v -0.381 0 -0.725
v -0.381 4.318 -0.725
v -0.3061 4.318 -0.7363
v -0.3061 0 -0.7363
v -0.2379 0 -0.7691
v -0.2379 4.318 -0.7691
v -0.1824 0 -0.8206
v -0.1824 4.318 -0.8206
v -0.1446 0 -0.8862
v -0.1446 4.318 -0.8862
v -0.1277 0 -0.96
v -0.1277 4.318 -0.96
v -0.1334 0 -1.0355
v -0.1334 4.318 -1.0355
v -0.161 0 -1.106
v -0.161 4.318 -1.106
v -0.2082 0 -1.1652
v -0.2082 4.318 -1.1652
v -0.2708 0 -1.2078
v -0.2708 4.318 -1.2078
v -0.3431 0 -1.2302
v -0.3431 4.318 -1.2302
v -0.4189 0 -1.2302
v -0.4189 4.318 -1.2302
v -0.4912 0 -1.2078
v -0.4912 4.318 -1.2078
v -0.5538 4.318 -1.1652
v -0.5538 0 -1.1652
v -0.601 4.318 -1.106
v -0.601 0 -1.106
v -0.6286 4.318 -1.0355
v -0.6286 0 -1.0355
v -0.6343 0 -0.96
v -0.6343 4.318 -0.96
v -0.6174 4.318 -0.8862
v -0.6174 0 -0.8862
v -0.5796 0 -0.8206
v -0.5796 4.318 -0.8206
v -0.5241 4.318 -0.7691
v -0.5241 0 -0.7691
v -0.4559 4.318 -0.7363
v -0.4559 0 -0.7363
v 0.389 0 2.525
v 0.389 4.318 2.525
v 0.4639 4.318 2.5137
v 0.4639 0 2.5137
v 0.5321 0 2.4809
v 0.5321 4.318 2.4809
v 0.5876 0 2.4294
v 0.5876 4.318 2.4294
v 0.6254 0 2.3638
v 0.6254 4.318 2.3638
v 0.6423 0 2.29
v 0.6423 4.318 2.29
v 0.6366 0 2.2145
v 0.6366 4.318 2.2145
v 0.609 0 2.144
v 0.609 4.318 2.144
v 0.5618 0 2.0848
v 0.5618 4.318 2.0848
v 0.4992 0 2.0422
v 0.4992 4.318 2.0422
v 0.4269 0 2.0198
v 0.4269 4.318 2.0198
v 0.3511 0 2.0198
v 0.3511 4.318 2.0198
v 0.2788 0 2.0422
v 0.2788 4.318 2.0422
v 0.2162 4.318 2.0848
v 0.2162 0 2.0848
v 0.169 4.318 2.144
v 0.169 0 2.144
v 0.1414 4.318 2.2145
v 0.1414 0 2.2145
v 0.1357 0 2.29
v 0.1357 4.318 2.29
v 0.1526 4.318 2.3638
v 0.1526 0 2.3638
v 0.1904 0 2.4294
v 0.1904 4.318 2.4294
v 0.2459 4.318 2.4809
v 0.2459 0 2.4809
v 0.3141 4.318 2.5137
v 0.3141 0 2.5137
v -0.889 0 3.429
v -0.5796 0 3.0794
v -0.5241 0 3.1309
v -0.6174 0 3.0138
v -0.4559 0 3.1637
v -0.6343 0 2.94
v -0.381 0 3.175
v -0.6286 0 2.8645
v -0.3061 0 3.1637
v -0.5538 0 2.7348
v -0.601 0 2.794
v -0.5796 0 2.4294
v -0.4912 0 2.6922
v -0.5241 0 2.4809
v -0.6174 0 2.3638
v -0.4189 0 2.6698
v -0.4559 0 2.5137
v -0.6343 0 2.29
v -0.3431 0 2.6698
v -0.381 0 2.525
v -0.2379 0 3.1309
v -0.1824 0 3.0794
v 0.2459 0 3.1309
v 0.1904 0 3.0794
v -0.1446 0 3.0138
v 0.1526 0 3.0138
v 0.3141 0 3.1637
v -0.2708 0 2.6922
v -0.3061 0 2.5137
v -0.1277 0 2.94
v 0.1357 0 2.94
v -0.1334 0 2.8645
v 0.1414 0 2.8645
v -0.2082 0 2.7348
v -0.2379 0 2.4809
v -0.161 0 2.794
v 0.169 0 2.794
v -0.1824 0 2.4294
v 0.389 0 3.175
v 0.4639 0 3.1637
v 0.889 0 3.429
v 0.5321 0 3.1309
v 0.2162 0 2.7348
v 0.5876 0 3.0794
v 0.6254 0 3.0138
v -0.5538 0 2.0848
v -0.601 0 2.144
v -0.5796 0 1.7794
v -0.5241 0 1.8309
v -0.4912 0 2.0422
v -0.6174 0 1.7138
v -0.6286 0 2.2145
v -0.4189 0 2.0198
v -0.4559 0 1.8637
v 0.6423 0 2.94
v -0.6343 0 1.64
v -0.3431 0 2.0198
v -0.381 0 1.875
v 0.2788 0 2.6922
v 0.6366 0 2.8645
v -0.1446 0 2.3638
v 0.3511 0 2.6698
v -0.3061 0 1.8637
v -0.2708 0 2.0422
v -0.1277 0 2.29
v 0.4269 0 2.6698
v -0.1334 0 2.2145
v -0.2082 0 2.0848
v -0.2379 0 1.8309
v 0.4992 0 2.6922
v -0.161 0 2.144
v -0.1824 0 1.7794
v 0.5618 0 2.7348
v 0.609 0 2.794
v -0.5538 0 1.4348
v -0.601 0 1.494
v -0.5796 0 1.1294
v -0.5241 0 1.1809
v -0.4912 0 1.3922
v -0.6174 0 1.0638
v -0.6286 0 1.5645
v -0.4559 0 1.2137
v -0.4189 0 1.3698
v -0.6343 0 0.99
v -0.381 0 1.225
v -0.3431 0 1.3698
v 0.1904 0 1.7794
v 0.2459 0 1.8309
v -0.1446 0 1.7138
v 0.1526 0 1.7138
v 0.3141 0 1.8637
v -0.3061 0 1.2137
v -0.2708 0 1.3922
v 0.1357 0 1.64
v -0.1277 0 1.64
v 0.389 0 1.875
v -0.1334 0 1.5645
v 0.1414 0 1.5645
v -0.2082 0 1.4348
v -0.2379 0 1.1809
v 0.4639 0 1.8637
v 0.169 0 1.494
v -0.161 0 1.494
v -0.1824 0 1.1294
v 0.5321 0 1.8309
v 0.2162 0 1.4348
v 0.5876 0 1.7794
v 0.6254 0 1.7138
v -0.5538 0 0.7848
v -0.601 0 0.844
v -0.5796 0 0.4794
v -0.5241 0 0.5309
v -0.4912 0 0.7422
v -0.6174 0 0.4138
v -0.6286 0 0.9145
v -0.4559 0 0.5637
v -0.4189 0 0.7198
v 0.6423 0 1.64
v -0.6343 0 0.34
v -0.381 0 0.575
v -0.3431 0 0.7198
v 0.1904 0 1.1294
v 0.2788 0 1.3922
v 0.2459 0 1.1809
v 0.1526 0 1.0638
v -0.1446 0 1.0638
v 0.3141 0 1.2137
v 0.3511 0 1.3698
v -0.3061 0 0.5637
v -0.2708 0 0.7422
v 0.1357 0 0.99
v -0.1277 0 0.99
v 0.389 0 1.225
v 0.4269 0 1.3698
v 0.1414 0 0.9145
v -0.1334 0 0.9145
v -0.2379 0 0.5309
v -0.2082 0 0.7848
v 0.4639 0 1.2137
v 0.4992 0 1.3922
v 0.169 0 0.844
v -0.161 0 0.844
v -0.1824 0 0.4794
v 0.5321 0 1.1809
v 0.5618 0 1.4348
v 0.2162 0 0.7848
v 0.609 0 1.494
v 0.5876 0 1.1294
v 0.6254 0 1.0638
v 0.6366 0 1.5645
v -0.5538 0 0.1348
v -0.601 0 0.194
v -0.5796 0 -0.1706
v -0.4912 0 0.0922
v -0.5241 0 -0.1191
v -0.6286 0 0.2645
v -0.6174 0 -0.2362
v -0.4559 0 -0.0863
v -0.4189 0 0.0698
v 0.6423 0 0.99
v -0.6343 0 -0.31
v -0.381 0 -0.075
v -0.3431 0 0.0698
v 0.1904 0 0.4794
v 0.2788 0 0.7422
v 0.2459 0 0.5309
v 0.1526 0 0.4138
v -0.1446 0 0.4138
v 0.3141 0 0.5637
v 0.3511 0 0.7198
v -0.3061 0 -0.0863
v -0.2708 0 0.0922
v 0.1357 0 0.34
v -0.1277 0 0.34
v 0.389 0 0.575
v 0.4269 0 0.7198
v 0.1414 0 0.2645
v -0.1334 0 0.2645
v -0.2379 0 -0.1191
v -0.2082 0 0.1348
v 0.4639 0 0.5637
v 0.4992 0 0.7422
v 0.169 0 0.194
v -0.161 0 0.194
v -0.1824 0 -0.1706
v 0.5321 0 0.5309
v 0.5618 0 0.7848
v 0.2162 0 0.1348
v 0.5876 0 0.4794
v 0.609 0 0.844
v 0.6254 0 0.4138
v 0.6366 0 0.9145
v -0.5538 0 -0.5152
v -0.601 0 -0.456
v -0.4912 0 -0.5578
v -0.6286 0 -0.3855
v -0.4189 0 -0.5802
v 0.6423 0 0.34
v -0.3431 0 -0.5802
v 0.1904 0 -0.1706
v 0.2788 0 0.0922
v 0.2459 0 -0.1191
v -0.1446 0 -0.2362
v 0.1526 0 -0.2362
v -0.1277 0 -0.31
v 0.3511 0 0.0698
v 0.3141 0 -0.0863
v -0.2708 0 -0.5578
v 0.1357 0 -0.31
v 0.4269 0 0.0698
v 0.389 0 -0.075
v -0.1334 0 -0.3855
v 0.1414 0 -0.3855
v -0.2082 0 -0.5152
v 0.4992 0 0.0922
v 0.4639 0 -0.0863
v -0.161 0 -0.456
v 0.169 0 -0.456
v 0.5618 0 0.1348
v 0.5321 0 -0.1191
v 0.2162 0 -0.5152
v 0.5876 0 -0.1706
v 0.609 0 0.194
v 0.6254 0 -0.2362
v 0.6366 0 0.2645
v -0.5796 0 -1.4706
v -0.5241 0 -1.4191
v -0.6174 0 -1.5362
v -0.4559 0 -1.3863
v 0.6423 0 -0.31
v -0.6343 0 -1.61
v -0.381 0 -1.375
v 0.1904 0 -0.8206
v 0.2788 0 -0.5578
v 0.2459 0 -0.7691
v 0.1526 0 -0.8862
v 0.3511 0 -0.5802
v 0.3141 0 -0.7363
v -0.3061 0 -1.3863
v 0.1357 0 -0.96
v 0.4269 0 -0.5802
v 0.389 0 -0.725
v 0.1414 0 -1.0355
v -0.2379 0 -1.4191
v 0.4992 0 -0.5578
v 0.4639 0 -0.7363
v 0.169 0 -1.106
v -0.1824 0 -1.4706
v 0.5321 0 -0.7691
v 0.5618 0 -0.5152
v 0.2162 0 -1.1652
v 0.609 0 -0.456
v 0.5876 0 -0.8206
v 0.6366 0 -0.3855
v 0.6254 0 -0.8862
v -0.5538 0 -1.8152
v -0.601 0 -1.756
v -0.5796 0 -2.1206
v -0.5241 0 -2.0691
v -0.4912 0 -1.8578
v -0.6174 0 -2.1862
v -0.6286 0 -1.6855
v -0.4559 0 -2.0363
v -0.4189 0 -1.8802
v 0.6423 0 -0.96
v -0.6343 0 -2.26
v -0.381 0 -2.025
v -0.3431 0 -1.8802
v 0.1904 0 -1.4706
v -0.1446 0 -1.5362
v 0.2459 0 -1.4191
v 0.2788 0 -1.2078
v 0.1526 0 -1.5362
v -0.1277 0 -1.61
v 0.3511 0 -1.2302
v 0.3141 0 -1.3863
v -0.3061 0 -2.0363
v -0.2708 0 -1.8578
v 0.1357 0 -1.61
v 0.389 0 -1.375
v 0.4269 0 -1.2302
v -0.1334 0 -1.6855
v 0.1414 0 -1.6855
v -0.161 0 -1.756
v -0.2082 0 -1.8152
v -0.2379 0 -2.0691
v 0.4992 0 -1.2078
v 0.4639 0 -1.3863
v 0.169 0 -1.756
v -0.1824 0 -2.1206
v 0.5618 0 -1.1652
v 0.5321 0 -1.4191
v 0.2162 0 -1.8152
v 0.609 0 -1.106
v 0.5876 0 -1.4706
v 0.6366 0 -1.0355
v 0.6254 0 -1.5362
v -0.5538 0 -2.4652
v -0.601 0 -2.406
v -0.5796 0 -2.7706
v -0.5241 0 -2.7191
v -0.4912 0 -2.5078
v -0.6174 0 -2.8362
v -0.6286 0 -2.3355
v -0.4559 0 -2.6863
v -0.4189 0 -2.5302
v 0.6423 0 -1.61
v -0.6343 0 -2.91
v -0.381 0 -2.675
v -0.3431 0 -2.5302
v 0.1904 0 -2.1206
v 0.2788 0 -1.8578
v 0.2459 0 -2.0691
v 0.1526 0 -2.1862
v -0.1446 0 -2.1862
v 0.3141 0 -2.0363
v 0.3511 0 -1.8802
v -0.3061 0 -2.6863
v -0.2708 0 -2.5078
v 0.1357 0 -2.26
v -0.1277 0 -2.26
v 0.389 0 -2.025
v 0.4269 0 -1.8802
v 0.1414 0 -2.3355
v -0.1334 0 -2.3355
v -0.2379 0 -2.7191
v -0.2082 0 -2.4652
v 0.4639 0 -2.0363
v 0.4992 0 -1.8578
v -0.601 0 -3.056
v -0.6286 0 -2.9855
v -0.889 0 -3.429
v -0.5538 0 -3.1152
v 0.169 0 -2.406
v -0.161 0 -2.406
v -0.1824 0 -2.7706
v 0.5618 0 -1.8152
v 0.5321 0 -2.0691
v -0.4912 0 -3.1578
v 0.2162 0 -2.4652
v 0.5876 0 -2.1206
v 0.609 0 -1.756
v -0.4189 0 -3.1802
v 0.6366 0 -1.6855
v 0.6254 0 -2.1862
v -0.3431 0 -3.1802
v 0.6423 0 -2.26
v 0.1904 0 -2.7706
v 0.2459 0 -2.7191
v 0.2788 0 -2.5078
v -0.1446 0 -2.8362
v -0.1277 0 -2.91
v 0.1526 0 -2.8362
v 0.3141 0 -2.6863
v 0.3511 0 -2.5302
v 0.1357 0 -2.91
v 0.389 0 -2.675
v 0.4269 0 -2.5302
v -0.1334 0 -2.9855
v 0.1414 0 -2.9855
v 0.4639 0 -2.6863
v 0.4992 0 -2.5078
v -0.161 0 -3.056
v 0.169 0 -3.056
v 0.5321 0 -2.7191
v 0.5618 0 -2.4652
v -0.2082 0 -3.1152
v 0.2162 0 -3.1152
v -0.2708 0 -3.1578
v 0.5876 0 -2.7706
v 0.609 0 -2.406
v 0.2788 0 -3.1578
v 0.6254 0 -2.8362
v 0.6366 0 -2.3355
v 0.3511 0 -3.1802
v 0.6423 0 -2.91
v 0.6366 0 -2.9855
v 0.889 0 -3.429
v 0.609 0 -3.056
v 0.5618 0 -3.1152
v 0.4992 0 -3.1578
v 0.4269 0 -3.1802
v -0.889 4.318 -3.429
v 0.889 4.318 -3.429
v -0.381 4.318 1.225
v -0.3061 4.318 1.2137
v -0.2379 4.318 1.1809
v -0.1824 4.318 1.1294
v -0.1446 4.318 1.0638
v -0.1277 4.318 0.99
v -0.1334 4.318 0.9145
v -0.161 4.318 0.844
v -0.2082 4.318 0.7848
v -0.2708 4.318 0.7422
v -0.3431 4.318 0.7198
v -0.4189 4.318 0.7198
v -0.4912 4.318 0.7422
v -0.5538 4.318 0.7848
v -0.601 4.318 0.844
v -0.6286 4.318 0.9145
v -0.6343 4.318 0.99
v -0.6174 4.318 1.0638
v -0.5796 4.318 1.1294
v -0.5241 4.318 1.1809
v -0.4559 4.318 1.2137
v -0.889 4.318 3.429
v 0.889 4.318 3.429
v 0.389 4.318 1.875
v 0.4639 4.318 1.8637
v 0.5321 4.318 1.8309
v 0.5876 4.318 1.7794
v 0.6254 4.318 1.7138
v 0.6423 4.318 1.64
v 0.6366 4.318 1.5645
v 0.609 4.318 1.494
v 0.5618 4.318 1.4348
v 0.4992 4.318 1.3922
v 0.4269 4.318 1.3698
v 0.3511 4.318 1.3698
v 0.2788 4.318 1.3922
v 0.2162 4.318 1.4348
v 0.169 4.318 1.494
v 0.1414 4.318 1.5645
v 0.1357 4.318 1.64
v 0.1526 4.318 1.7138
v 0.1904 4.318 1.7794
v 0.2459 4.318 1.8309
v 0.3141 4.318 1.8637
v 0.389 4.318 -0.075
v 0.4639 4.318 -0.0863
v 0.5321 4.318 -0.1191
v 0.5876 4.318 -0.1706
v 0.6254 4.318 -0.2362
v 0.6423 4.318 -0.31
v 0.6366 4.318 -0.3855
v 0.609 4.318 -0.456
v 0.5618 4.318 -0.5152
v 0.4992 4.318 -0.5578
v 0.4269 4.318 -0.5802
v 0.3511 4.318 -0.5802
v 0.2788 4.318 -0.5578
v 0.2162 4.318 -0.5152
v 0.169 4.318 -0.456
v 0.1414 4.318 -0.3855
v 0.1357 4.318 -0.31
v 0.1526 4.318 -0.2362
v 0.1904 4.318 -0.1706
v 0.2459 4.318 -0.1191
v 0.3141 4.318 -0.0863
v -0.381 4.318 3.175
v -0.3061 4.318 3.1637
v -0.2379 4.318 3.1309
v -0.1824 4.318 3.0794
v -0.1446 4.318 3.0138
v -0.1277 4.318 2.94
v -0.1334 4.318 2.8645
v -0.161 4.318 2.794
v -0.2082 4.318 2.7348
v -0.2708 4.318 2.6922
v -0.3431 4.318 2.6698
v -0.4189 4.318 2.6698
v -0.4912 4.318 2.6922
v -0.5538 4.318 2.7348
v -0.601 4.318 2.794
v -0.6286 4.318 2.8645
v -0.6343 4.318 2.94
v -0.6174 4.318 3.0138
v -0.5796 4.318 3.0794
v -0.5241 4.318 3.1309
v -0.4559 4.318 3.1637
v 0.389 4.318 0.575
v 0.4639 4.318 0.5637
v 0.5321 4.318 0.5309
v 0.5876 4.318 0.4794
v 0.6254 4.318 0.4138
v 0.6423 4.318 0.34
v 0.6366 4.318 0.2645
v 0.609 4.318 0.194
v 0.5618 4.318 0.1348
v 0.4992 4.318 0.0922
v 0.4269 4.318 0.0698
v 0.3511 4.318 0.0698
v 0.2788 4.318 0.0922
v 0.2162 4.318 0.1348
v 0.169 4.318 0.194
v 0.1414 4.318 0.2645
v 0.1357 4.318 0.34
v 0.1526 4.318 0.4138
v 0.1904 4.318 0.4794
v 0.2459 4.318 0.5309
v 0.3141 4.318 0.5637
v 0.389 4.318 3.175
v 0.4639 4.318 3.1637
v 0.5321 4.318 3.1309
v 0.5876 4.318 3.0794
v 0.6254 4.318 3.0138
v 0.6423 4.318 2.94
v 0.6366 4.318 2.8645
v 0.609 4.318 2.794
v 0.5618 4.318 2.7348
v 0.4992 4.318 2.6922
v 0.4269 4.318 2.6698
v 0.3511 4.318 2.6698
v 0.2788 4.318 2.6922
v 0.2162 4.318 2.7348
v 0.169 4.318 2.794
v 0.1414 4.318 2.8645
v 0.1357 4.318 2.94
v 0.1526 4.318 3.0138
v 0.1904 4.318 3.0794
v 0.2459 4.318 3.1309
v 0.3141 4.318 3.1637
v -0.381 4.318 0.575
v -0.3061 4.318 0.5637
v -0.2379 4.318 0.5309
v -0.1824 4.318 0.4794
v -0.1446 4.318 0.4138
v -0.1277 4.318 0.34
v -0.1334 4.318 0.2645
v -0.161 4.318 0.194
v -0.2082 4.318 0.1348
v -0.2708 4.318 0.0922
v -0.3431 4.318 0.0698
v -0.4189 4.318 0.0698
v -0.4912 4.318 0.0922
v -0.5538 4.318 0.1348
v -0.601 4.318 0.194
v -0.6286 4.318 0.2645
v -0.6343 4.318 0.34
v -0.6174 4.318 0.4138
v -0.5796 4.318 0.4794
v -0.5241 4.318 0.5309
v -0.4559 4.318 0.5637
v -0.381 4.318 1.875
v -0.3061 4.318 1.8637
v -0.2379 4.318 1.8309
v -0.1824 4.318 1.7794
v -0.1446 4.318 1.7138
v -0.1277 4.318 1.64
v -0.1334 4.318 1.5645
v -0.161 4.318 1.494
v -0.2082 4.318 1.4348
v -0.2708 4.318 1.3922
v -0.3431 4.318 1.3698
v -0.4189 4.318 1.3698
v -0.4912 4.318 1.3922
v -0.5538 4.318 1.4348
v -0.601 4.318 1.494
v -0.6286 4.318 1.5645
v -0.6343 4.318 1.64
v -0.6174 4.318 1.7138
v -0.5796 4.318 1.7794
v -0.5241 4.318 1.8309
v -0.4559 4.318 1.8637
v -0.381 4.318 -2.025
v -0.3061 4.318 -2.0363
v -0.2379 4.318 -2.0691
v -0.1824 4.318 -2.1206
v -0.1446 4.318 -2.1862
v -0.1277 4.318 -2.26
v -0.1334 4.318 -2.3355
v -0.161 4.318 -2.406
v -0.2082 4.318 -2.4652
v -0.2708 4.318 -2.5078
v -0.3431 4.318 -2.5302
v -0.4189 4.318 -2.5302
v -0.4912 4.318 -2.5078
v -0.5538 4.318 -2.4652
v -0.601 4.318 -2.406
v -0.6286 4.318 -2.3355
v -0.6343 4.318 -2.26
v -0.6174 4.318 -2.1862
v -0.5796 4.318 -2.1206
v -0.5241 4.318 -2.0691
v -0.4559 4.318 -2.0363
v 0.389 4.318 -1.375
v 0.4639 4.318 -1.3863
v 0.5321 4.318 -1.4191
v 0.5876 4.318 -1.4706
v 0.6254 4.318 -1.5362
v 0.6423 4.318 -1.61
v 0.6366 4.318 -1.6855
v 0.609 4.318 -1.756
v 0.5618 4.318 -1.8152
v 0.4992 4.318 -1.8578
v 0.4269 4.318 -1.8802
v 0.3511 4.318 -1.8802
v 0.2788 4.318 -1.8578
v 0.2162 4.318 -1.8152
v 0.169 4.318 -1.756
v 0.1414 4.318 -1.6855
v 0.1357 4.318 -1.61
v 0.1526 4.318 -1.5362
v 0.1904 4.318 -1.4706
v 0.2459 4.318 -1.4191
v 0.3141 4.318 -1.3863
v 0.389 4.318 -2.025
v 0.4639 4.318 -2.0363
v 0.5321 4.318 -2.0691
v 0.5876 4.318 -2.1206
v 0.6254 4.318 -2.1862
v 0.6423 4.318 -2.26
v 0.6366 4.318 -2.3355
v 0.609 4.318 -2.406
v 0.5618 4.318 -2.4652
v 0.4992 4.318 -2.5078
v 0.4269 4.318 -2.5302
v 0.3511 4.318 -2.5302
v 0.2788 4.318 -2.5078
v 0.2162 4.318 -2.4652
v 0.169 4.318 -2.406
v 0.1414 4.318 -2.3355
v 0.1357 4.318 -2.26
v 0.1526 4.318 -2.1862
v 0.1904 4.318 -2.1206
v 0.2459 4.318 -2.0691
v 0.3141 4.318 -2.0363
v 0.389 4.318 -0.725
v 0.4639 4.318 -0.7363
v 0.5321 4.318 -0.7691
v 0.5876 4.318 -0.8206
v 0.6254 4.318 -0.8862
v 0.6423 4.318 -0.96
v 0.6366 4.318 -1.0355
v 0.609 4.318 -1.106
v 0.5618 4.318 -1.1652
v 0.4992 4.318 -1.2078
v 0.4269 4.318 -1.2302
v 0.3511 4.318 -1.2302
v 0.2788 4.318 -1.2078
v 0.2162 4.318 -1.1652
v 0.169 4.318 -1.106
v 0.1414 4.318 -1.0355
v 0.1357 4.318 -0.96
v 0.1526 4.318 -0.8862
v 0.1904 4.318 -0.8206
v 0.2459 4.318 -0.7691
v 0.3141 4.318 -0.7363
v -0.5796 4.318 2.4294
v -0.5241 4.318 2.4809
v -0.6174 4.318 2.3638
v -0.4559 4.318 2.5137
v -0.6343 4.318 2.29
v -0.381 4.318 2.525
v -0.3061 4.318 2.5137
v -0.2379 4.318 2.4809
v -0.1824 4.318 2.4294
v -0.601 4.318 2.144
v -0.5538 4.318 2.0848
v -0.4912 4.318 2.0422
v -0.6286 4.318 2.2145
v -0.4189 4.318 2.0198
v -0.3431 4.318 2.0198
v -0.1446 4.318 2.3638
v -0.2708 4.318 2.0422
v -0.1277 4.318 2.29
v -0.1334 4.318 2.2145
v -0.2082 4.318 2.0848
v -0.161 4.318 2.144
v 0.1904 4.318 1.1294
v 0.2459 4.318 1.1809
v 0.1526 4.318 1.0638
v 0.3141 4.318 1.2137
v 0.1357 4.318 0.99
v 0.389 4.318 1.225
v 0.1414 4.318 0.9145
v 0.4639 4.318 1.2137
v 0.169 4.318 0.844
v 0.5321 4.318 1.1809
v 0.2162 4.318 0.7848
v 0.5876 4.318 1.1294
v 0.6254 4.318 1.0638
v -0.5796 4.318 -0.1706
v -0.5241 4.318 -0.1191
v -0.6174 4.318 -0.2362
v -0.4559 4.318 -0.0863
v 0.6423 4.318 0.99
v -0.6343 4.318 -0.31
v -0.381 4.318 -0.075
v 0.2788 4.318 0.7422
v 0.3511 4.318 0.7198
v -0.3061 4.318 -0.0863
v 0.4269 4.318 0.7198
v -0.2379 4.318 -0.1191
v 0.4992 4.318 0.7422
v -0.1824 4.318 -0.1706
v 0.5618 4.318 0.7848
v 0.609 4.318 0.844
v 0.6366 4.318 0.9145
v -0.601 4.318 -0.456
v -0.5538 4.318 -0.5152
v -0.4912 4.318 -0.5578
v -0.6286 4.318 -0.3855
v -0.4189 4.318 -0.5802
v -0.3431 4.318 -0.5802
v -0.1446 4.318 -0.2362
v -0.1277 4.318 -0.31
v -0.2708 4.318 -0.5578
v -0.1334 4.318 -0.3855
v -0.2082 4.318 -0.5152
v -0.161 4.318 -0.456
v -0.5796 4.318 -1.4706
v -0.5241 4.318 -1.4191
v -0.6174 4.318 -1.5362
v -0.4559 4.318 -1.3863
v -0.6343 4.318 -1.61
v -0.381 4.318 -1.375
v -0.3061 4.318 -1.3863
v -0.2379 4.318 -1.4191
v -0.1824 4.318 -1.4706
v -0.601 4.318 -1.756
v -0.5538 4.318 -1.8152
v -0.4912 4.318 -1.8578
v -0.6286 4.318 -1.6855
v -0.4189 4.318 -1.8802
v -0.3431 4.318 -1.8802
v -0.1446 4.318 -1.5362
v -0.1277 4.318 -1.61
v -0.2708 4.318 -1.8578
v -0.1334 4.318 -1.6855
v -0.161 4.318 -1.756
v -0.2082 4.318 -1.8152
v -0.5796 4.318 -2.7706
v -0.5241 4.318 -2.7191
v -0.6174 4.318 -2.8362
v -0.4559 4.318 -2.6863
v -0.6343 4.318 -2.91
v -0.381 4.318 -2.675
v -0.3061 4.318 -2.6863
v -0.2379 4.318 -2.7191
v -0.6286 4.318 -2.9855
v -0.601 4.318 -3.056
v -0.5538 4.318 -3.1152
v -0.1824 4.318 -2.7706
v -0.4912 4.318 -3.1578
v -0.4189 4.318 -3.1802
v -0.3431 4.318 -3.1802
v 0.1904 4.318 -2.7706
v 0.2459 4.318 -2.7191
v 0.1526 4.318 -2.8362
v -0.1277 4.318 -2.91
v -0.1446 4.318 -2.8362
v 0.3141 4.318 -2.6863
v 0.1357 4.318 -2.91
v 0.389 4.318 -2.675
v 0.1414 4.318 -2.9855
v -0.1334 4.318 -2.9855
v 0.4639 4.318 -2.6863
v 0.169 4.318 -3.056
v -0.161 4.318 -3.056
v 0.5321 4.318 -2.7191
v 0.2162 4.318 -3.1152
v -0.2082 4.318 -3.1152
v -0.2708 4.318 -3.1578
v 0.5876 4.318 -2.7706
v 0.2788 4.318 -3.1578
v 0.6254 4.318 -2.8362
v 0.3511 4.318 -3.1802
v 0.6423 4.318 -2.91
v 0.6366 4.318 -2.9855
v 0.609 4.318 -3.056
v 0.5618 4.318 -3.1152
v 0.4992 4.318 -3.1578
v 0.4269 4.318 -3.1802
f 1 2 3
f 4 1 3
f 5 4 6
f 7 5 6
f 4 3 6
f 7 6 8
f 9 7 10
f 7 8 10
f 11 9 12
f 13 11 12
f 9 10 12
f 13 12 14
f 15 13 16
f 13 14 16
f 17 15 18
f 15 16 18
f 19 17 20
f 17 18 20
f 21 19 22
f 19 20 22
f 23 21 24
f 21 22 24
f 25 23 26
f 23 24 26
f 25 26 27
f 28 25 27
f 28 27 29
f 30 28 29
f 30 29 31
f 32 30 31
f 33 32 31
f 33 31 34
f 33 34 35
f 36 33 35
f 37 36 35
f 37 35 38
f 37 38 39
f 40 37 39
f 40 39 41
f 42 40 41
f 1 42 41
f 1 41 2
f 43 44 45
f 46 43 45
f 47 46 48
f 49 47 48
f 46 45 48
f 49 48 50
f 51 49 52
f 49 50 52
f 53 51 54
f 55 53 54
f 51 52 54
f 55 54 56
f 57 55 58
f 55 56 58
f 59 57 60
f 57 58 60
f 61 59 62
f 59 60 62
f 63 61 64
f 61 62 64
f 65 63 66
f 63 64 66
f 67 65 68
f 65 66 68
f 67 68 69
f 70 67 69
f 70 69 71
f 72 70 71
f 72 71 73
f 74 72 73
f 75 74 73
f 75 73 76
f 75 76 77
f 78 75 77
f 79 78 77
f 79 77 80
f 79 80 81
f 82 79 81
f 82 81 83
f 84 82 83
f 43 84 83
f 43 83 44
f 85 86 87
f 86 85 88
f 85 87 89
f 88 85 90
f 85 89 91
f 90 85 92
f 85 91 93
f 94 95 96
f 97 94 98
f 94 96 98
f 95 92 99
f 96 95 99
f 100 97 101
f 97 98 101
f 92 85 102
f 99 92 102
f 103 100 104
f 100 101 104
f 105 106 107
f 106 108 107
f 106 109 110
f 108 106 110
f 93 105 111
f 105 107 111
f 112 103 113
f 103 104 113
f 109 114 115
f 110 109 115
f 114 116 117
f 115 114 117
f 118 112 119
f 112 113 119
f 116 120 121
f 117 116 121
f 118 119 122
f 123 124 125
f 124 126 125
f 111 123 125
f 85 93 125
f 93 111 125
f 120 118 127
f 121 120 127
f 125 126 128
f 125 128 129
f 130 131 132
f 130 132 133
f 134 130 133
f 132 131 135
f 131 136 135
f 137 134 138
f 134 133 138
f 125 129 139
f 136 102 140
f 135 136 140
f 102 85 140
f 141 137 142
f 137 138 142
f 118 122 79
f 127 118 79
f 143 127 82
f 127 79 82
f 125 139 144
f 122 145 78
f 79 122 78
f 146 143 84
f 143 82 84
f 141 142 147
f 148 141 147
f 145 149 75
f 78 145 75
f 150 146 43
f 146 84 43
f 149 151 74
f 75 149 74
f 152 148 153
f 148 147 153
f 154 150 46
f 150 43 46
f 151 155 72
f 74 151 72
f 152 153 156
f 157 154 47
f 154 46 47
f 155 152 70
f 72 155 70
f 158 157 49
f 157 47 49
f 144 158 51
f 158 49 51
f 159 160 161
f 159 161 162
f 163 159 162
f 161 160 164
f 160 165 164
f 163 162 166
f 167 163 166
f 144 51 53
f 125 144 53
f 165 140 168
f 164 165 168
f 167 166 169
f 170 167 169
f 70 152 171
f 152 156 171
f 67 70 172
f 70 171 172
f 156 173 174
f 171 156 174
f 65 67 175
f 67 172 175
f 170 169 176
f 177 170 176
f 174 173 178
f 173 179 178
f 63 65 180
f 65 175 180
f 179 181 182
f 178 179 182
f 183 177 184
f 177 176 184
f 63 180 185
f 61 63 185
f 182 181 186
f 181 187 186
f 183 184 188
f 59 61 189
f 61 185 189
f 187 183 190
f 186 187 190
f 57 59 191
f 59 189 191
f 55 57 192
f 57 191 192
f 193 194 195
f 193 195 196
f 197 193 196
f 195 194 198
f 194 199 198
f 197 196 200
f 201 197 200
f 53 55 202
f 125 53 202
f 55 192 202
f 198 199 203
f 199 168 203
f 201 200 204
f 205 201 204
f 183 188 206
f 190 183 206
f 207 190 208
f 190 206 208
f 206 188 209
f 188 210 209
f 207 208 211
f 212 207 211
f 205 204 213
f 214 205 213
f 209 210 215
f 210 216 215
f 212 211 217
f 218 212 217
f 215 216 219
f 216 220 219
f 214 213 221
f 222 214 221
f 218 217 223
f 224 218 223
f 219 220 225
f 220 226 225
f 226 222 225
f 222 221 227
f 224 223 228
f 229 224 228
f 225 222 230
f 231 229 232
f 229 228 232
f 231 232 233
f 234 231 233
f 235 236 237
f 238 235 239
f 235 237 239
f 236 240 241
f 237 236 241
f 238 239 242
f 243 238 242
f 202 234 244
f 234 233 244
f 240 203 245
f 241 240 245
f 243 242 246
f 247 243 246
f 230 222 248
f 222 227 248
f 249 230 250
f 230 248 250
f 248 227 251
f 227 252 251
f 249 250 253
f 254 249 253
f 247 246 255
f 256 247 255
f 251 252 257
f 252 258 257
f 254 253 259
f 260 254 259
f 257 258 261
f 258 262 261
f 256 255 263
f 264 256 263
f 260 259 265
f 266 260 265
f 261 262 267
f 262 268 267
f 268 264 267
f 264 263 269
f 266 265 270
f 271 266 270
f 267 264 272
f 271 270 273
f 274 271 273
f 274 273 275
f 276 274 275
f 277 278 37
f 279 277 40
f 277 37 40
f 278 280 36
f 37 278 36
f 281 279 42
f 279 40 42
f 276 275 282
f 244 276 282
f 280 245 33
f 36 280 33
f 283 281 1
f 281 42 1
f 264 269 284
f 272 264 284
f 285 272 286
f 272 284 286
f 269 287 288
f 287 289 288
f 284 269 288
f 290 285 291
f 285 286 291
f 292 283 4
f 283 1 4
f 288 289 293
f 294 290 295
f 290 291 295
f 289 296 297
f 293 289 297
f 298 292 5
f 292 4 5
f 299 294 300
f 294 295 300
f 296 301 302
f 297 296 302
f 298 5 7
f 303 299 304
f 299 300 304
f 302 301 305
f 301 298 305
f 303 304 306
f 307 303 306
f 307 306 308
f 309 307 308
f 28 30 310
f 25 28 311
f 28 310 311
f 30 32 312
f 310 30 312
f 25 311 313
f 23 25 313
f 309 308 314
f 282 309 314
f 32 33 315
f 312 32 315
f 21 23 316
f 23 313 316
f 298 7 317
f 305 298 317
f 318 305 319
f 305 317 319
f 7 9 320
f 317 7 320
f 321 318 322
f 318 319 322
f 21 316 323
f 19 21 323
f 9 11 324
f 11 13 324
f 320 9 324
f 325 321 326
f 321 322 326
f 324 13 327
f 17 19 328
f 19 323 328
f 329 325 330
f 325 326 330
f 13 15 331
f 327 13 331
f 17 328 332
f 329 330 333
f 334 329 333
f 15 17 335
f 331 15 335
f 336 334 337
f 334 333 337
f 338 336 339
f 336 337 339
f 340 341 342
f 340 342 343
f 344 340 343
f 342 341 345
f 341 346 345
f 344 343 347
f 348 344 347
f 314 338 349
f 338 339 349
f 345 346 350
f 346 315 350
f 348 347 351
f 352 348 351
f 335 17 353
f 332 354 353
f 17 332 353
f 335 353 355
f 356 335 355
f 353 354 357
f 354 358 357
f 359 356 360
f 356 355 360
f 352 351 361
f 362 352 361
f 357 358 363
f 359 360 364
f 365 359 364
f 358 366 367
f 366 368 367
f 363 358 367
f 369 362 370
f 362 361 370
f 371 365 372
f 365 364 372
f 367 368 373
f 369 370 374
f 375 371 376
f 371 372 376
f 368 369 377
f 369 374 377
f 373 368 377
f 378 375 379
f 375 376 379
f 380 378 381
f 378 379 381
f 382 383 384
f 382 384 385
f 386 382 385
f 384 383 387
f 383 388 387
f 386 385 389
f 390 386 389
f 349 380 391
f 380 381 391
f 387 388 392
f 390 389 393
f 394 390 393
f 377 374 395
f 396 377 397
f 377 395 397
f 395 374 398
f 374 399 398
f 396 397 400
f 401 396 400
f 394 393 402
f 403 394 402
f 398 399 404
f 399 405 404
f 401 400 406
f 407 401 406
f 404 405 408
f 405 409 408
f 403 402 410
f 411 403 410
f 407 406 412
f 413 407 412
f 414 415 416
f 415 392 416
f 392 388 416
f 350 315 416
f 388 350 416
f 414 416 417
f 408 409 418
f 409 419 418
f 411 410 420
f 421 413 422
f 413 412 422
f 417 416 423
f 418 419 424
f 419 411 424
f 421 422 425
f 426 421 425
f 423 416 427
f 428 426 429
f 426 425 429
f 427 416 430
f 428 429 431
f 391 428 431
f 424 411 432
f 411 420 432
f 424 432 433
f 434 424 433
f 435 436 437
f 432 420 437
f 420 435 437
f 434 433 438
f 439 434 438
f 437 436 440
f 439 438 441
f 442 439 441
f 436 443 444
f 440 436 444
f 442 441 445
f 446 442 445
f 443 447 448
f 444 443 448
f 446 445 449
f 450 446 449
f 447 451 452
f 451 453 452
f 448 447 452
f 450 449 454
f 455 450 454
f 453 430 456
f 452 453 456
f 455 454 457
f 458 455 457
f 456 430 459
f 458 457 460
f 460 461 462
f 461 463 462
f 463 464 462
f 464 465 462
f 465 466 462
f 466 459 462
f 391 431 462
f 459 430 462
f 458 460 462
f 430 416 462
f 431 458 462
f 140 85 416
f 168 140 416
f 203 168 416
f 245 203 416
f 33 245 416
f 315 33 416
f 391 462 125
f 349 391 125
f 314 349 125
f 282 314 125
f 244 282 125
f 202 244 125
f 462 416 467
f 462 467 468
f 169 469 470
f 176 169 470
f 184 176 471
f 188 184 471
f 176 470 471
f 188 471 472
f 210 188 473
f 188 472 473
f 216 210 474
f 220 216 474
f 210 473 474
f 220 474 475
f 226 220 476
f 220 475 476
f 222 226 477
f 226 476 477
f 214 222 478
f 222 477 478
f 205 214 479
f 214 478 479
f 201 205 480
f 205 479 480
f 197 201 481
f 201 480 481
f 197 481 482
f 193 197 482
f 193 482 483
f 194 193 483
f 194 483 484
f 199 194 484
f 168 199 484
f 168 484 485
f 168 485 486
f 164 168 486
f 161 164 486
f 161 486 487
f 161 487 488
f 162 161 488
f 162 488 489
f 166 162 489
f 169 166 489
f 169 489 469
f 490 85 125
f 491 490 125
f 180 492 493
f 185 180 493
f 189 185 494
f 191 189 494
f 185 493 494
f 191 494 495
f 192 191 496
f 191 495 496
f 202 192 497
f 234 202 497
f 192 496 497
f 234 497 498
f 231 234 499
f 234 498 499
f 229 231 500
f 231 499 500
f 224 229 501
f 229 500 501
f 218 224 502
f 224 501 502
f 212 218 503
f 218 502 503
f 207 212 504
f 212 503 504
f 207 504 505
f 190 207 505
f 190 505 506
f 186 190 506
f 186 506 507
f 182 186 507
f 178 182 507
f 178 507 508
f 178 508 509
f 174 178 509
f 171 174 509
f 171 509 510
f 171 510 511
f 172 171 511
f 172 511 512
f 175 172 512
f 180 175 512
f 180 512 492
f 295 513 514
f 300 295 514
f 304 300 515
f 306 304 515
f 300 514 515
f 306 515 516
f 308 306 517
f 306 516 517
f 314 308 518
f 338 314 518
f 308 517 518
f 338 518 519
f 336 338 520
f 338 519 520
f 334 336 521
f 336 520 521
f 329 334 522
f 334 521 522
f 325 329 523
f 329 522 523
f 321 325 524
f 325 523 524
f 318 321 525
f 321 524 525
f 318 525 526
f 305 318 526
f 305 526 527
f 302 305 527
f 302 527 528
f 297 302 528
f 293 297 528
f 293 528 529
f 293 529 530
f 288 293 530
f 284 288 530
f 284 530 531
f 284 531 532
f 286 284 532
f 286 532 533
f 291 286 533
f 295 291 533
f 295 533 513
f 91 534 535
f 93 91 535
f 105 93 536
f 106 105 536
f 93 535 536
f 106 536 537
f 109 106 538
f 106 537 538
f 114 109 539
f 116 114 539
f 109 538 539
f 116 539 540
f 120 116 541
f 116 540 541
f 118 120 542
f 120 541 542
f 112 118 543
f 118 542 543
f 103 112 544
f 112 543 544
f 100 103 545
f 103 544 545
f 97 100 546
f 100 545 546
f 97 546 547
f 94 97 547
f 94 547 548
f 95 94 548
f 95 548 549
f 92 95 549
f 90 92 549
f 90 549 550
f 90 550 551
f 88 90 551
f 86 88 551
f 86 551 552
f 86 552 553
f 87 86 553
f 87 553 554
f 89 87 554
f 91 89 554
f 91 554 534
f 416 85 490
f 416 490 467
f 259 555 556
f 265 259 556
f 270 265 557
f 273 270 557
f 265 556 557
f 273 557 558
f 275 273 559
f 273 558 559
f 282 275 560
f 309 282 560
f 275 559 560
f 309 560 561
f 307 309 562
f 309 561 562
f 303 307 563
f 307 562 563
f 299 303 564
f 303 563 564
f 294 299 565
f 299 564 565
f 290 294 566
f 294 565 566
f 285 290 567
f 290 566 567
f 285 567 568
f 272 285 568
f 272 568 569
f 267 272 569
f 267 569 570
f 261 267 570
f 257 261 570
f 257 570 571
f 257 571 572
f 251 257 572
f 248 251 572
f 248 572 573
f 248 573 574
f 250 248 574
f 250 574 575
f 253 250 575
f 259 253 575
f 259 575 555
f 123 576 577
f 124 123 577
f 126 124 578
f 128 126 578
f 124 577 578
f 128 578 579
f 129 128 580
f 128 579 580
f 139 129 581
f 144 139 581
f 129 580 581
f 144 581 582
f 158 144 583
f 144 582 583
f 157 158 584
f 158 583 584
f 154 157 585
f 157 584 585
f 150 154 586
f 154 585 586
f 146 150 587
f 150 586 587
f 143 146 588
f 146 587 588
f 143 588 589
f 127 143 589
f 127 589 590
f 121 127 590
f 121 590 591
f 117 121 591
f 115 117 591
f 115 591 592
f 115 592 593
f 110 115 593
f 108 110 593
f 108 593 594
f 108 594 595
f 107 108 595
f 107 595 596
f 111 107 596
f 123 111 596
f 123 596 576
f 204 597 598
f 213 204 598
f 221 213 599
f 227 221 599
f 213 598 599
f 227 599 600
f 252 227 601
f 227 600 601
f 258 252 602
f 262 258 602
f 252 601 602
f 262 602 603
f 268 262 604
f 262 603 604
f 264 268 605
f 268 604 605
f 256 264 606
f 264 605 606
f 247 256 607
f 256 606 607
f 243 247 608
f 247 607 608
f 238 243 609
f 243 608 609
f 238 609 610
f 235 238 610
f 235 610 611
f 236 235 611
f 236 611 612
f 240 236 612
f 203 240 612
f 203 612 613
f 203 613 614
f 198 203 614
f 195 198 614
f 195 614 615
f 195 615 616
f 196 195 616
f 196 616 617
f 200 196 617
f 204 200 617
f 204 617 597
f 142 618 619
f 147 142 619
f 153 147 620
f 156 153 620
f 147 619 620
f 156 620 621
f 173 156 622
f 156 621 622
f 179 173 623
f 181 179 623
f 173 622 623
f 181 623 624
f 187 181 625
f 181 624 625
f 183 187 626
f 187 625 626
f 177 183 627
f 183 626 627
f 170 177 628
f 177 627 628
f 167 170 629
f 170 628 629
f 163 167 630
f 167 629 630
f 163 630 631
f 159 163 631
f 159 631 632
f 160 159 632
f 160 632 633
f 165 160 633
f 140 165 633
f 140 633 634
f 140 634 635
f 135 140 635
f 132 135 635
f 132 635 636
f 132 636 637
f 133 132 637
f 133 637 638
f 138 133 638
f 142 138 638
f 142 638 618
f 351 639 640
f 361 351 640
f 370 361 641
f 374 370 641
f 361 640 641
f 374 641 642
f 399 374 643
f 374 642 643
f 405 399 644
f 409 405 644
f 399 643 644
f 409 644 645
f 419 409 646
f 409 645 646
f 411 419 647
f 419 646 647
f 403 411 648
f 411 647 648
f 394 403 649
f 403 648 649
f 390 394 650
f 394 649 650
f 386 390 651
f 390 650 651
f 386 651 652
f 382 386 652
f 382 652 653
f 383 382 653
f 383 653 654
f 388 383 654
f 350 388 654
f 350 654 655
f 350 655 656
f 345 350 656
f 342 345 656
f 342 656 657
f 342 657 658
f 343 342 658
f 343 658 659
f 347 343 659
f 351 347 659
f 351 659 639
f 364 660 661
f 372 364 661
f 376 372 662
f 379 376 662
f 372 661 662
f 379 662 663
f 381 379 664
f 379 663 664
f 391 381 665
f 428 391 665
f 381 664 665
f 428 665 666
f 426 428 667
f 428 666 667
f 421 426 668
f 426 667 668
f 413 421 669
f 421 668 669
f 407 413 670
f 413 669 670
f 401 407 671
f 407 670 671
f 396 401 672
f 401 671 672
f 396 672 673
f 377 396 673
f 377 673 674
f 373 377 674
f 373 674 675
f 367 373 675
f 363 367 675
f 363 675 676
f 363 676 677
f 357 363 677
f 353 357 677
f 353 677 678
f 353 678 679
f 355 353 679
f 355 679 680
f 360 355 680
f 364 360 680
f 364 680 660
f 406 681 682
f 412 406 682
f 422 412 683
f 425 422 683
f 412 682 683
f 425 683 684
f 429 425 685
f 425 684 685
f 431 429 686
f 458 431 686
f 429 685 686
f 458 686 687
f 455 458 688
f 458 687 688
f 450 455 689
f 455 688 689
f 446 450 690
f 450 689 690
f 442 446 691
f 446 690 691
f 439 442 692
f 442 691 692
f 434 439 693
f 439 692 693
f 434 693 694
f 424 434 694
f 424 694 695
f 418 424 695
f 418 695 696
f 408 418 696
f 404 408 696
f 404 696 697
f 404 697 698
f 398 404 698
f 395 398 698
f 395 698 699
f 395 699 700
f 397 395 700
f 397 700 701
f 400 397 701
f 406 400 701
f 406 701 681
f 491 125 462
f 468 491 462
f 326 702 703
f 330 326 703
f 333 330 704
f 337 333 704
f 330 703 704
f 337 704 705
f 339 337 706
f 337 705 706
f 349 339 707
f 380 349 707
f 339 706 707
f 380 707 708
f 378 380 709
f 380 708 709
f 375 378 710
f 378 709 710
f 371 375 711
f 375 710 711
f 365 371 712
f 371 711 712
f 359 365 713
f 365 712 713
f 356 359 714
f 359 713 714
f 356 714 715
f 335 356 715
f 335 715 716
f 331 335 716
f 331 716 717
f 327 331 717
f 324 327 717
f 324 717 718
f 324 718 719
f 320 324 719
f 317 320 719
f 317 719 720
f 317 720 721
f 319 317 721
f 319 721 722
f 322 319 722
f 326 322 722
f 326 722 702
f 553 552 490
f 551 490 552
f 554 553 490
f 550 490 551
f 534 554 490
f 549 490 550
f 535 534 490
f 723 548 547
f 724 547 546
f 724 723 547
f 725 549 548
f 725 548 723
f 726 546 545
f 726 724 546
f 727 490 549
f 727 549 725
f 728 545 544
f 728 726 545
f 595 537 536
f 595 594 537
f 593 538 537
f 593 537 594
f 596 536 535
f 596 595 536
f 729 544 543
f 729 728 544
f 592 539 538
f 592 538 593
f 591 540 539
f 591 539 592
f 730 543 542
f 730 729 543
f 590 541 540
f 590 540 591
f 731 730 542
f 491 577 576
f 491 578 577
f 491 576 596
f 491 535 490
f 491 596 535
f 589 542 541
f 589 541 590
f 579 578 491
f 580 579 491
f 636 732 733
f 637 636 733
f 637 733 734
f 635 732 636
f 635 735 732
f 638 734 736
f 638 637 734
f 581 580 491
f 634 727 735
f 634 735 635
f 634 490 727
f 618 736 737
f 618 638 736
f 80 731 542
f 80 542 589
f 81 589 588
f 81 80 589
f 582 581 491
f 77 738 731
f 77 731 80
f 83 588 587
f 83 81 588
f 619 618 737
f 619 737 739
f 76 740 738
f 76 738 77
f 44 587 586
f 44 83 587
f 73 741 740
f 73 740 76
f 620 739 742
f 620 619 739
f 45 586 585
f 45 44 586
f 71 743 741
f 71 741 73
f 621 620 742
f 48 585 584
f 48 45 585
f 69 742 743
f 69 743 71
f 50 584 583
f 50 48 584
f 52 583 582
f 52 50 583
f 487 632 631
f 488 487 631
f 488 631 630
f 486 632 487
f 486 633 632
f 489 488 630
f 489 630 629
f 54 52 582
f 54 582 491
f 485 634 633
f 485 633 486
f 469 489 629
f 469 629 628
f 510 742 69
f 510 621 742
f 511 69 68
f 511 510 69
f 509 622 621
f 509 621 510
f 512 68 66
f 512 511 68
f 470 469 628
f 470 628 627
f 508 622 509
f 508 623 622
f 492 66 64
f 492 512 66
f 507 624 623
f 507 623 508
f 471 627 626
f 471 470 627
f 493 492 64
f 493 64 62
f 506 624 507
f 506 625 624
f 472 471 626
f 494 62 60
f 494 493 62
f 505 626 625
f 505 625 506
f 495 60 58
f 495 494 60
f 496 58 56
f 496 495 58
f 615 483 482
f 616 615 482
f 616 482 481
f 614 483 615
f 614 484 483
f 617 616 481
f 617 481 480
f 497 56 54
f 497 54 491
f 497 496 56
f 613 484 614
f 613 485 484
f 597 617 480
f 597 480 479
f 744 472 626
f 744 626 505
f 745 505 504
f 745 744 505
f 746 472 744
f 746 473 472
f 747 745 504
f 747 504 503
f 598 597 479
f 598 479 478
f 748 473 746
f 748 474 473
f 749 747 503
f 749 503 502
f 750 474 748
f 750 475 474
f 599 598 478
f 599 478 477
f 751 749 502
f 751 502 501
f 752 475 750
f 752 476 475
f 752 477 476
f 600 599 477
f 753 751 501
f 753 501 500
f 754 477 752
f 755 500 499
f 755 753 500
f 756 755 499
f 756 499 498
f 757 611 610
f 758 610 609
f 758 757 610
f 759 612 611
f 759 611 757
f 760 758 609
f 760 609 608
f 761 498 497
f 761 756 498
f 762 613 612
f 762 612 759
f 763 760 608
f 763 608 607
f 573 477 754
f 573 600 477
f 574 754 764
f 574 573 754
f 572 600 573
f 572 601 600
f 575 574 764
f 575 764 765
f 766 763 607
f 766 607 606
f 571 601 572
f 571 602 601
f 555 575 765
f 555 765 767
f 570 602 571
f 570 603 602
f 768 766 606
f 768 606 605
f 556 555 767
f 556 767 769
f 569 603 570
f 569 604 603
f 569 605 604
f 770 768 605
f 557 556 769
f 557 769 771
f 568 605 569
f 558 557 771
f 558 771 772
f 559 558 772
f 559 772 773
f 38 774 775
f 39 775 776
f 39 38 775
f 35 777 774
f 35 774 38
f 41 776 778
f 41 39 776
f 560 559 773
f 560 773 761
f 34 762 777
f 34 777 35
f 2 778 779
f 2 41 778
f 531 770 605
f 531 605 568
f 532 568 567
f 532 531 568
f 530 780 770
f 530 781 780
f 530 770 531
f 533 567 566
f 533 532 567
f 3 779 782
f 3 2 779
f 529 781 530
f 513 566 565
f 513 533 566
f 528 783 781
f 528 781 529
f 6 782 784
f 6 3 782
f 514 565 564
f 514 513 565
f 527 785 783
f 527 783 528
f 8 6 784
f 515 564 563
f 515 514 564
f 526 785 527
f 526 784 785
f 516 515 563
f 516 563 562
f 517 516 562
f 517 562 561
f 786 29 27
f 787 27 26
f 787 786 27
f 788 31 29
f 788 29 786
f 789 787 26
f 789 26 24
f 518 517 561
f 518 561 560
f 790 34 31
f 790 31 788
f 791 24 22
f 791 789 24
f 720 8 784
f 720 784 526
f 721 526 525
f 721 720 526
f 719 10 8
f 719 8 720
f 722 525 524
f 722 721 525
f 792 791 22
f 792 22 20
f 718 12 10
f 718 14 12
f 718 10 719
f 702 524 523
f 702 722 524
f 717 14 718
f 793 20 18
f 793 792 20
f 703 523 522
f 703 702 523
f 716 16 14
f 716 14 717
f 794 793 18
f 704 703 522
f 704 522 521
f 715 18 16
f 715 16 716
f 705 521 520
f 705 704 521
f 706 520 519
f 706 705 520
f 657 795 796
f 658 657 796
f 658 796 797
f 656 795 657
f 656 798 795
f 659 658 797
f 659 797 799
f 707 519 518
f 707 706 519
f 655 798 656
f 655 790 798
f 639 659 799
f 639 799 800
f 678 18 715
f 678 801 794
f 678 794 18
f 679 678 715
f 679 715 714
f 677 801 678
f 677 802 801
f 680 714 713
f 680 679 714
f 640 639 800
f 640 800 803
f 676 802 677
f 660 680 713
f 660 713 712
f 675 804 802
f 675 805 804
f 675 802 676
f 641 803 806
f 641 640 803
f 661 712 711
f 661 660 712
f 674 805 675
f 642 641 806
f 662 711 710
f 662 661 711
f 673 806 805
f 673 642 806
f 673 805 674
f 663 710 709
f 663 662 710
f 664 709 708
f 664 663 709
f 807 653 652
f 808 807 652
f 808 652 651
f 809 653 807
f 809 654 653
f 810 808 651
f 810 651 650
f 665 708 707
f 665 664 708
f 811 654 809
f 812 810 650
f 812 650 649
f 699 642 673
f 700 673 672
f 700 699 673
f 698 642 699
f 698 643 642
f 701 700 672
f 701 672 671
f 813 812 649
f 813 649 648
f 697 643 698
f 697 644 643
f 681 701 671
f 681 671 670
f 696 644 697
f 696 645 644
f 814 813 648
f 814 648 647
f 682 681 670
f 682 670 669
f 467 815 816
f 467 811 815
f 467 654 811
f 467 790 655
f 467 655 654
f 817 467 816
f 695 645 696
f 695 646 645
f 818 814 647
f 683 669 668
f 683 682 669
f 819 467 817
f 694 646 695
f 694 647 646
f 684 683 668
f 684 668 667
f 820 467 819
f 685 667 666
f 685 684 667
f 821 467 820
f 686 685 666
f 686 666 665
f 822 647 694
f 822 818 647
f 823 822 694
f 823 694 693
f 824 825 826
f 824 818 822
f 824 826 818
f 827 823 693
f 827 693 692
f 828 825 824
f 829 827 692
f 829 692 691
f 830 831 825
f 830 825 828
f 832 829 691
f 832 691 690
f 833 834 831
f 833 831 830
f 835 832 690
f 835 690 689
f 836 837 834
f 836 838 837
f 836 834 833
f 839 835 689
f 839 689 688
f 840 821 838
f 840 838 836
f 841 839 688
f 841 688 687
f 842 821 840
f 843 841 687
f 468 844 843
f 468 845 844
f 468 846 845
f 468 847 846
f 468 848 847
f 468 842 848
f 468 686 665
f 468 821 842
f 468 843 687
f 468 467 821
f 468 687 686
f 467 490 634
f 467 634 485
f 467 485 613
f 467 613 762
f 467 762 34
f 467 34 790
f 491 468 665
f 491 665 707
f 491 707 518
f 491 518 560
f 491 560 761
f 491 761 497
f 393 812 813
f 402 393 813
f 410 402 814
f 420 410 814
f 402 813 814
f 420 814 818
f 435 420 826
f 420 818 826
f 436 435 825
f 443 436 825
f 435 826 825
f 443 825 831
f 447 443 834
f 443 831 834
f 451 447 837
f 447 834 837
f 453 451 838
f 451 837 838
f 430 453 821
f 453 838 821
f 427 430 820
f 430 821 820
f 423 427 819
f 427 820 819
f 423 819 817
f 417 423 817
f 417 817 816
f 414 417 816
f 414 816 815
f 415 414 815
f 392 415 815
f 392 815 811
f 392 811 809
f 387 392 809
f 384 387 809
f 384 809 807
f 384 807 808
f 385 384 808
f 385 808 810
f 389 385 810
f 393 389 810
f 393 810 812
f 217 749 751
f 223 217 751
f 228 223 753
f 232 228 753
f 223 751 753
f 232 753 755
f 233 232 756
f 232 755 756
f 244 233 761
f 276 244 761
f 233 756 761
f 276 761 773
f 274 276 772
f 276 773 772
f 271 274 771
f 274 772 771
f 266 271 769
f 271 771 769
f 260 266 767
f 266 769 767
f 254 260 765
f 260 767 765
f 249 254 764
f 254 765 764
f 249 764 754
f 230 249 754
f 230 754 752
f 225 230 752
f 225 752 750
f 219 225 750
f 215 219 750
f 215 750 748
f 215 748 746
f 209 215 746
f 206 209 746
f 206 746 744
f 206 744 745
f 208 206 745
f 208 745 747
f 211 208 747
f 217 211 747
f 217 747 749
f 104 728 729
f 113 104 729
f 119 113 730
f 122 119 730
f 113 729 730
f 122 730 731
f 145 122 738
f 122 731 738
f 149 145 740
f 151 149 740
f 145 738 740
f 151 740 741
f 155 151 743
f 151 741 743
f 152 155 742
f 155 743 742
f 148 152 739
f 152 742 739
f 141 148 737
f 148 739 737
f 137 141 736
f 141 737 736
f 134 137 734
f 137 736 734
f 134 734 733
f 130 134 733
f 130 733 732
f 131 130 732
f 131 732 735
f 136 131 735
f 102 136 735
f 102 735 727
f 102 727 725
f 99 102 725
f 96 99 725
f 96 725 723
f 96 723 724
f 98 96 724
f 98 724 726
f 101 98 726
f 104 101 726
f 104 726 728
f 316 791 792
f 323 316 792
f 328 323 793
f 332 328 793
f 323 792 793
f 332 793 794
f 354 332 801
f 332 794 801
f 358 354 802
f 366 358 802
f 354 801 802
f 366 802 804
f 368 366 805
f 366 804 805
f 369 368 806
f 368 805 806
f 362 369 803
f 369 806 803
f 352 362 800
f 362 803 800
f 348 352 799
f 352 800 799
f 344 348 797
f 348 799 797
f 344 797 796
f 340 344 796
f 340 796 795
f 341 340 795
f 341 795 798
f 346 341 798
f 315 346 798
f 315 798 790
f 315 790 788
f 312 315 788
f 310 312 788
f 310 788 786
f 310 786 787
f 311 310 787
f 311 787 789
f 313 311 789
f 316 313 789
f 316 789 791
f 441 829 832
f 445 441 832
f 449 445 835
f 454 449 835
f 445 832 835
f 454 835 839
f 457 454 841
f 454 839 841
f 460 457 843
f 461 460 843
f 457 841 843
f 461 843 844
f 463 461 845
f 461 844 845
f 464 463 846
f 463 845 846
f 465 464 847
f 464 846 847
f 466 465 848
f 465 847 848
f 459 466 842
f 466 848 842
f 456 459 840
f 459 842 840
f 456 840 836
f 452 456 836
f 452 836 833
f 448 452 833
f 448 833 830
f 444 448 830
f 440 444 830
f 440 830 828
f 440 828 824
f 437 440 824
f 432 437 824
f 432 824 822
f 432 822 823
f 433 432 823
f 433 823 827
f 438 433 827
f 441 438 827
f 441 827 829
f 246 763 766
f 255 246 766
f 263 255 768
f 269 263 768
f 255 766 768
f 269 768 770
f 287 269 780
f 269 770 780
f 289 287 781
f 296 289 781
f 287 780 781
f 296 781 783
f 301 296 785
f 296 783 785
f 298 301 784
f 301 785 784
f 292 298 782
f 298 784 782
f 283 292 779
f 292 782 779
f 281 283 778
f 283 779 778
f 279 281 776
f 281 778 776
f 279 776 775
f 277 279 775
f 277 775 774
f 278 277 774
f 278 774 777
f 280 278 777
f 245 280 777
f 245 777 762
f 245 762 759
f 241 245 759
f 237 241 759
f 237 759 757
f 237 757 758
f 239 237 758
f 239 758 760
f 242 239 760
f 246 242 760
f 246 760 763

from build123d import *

# Parameters (mm, degrees)
SKETCH1_W            = 1.778
SKETCH1_H            = 6.858
BOSS_EXTRUDE1_DEPTH  = 4.318
SKETCH3_R            = 0.254
CUT_EXTRUDE2_DEPTH   = 6.585112891
LPATTERN2_COUNT      = 10
LPATTERN2_PITCH      = 0.65
LPATTERN2_COUNT_DIR2 = 2
LPATTERN2_PITCH_DIR2 = 0.77


with BuildPart() as part:
    # Sketch1 → Boss-Extrude1 (new body)
    with BuildSketch(Plane(origin=(0, 0, 0), x_dir=(1, 0, 0), z_dir=(0, 1, 0))):
        Rectangle(SKETCH1_W, SKETCH1_H)
    extrude(amount=BOSS_EXTRUDE1_DEPTH)

    # Sketch3 → Cut-Extrude2 (cut, through all)
    with BuildSketch(Plane(origin=(0, 4.318, 0), x_dir=(1, 0, 0), z_dir=(0, 1, 0))):
        with Locations(Location((-0.381, -2.921, 0), (0, 0, 270))):
            Circle(SKETCH3_R)
    cut_extrude2 = extrude(amount=-CUT_EXTRUDE2_DEPTH, mode=Mode.SUBTRACT)

    # LPattern2: Cut-Extrude2 10 × 2
    with Locations(*[(j * LPATTERN2_PITCH_DIR2, 0, -i * LPATTERN2_PITCH) for i in range(LPATTERN2_COUNT) for j in range(LPATTERN2_COUNT_DIR2) if (i, j) != (0, 0)]):
        add(cut_extrude2, mode=Mode.SUBTRACT)


solid = part.part
